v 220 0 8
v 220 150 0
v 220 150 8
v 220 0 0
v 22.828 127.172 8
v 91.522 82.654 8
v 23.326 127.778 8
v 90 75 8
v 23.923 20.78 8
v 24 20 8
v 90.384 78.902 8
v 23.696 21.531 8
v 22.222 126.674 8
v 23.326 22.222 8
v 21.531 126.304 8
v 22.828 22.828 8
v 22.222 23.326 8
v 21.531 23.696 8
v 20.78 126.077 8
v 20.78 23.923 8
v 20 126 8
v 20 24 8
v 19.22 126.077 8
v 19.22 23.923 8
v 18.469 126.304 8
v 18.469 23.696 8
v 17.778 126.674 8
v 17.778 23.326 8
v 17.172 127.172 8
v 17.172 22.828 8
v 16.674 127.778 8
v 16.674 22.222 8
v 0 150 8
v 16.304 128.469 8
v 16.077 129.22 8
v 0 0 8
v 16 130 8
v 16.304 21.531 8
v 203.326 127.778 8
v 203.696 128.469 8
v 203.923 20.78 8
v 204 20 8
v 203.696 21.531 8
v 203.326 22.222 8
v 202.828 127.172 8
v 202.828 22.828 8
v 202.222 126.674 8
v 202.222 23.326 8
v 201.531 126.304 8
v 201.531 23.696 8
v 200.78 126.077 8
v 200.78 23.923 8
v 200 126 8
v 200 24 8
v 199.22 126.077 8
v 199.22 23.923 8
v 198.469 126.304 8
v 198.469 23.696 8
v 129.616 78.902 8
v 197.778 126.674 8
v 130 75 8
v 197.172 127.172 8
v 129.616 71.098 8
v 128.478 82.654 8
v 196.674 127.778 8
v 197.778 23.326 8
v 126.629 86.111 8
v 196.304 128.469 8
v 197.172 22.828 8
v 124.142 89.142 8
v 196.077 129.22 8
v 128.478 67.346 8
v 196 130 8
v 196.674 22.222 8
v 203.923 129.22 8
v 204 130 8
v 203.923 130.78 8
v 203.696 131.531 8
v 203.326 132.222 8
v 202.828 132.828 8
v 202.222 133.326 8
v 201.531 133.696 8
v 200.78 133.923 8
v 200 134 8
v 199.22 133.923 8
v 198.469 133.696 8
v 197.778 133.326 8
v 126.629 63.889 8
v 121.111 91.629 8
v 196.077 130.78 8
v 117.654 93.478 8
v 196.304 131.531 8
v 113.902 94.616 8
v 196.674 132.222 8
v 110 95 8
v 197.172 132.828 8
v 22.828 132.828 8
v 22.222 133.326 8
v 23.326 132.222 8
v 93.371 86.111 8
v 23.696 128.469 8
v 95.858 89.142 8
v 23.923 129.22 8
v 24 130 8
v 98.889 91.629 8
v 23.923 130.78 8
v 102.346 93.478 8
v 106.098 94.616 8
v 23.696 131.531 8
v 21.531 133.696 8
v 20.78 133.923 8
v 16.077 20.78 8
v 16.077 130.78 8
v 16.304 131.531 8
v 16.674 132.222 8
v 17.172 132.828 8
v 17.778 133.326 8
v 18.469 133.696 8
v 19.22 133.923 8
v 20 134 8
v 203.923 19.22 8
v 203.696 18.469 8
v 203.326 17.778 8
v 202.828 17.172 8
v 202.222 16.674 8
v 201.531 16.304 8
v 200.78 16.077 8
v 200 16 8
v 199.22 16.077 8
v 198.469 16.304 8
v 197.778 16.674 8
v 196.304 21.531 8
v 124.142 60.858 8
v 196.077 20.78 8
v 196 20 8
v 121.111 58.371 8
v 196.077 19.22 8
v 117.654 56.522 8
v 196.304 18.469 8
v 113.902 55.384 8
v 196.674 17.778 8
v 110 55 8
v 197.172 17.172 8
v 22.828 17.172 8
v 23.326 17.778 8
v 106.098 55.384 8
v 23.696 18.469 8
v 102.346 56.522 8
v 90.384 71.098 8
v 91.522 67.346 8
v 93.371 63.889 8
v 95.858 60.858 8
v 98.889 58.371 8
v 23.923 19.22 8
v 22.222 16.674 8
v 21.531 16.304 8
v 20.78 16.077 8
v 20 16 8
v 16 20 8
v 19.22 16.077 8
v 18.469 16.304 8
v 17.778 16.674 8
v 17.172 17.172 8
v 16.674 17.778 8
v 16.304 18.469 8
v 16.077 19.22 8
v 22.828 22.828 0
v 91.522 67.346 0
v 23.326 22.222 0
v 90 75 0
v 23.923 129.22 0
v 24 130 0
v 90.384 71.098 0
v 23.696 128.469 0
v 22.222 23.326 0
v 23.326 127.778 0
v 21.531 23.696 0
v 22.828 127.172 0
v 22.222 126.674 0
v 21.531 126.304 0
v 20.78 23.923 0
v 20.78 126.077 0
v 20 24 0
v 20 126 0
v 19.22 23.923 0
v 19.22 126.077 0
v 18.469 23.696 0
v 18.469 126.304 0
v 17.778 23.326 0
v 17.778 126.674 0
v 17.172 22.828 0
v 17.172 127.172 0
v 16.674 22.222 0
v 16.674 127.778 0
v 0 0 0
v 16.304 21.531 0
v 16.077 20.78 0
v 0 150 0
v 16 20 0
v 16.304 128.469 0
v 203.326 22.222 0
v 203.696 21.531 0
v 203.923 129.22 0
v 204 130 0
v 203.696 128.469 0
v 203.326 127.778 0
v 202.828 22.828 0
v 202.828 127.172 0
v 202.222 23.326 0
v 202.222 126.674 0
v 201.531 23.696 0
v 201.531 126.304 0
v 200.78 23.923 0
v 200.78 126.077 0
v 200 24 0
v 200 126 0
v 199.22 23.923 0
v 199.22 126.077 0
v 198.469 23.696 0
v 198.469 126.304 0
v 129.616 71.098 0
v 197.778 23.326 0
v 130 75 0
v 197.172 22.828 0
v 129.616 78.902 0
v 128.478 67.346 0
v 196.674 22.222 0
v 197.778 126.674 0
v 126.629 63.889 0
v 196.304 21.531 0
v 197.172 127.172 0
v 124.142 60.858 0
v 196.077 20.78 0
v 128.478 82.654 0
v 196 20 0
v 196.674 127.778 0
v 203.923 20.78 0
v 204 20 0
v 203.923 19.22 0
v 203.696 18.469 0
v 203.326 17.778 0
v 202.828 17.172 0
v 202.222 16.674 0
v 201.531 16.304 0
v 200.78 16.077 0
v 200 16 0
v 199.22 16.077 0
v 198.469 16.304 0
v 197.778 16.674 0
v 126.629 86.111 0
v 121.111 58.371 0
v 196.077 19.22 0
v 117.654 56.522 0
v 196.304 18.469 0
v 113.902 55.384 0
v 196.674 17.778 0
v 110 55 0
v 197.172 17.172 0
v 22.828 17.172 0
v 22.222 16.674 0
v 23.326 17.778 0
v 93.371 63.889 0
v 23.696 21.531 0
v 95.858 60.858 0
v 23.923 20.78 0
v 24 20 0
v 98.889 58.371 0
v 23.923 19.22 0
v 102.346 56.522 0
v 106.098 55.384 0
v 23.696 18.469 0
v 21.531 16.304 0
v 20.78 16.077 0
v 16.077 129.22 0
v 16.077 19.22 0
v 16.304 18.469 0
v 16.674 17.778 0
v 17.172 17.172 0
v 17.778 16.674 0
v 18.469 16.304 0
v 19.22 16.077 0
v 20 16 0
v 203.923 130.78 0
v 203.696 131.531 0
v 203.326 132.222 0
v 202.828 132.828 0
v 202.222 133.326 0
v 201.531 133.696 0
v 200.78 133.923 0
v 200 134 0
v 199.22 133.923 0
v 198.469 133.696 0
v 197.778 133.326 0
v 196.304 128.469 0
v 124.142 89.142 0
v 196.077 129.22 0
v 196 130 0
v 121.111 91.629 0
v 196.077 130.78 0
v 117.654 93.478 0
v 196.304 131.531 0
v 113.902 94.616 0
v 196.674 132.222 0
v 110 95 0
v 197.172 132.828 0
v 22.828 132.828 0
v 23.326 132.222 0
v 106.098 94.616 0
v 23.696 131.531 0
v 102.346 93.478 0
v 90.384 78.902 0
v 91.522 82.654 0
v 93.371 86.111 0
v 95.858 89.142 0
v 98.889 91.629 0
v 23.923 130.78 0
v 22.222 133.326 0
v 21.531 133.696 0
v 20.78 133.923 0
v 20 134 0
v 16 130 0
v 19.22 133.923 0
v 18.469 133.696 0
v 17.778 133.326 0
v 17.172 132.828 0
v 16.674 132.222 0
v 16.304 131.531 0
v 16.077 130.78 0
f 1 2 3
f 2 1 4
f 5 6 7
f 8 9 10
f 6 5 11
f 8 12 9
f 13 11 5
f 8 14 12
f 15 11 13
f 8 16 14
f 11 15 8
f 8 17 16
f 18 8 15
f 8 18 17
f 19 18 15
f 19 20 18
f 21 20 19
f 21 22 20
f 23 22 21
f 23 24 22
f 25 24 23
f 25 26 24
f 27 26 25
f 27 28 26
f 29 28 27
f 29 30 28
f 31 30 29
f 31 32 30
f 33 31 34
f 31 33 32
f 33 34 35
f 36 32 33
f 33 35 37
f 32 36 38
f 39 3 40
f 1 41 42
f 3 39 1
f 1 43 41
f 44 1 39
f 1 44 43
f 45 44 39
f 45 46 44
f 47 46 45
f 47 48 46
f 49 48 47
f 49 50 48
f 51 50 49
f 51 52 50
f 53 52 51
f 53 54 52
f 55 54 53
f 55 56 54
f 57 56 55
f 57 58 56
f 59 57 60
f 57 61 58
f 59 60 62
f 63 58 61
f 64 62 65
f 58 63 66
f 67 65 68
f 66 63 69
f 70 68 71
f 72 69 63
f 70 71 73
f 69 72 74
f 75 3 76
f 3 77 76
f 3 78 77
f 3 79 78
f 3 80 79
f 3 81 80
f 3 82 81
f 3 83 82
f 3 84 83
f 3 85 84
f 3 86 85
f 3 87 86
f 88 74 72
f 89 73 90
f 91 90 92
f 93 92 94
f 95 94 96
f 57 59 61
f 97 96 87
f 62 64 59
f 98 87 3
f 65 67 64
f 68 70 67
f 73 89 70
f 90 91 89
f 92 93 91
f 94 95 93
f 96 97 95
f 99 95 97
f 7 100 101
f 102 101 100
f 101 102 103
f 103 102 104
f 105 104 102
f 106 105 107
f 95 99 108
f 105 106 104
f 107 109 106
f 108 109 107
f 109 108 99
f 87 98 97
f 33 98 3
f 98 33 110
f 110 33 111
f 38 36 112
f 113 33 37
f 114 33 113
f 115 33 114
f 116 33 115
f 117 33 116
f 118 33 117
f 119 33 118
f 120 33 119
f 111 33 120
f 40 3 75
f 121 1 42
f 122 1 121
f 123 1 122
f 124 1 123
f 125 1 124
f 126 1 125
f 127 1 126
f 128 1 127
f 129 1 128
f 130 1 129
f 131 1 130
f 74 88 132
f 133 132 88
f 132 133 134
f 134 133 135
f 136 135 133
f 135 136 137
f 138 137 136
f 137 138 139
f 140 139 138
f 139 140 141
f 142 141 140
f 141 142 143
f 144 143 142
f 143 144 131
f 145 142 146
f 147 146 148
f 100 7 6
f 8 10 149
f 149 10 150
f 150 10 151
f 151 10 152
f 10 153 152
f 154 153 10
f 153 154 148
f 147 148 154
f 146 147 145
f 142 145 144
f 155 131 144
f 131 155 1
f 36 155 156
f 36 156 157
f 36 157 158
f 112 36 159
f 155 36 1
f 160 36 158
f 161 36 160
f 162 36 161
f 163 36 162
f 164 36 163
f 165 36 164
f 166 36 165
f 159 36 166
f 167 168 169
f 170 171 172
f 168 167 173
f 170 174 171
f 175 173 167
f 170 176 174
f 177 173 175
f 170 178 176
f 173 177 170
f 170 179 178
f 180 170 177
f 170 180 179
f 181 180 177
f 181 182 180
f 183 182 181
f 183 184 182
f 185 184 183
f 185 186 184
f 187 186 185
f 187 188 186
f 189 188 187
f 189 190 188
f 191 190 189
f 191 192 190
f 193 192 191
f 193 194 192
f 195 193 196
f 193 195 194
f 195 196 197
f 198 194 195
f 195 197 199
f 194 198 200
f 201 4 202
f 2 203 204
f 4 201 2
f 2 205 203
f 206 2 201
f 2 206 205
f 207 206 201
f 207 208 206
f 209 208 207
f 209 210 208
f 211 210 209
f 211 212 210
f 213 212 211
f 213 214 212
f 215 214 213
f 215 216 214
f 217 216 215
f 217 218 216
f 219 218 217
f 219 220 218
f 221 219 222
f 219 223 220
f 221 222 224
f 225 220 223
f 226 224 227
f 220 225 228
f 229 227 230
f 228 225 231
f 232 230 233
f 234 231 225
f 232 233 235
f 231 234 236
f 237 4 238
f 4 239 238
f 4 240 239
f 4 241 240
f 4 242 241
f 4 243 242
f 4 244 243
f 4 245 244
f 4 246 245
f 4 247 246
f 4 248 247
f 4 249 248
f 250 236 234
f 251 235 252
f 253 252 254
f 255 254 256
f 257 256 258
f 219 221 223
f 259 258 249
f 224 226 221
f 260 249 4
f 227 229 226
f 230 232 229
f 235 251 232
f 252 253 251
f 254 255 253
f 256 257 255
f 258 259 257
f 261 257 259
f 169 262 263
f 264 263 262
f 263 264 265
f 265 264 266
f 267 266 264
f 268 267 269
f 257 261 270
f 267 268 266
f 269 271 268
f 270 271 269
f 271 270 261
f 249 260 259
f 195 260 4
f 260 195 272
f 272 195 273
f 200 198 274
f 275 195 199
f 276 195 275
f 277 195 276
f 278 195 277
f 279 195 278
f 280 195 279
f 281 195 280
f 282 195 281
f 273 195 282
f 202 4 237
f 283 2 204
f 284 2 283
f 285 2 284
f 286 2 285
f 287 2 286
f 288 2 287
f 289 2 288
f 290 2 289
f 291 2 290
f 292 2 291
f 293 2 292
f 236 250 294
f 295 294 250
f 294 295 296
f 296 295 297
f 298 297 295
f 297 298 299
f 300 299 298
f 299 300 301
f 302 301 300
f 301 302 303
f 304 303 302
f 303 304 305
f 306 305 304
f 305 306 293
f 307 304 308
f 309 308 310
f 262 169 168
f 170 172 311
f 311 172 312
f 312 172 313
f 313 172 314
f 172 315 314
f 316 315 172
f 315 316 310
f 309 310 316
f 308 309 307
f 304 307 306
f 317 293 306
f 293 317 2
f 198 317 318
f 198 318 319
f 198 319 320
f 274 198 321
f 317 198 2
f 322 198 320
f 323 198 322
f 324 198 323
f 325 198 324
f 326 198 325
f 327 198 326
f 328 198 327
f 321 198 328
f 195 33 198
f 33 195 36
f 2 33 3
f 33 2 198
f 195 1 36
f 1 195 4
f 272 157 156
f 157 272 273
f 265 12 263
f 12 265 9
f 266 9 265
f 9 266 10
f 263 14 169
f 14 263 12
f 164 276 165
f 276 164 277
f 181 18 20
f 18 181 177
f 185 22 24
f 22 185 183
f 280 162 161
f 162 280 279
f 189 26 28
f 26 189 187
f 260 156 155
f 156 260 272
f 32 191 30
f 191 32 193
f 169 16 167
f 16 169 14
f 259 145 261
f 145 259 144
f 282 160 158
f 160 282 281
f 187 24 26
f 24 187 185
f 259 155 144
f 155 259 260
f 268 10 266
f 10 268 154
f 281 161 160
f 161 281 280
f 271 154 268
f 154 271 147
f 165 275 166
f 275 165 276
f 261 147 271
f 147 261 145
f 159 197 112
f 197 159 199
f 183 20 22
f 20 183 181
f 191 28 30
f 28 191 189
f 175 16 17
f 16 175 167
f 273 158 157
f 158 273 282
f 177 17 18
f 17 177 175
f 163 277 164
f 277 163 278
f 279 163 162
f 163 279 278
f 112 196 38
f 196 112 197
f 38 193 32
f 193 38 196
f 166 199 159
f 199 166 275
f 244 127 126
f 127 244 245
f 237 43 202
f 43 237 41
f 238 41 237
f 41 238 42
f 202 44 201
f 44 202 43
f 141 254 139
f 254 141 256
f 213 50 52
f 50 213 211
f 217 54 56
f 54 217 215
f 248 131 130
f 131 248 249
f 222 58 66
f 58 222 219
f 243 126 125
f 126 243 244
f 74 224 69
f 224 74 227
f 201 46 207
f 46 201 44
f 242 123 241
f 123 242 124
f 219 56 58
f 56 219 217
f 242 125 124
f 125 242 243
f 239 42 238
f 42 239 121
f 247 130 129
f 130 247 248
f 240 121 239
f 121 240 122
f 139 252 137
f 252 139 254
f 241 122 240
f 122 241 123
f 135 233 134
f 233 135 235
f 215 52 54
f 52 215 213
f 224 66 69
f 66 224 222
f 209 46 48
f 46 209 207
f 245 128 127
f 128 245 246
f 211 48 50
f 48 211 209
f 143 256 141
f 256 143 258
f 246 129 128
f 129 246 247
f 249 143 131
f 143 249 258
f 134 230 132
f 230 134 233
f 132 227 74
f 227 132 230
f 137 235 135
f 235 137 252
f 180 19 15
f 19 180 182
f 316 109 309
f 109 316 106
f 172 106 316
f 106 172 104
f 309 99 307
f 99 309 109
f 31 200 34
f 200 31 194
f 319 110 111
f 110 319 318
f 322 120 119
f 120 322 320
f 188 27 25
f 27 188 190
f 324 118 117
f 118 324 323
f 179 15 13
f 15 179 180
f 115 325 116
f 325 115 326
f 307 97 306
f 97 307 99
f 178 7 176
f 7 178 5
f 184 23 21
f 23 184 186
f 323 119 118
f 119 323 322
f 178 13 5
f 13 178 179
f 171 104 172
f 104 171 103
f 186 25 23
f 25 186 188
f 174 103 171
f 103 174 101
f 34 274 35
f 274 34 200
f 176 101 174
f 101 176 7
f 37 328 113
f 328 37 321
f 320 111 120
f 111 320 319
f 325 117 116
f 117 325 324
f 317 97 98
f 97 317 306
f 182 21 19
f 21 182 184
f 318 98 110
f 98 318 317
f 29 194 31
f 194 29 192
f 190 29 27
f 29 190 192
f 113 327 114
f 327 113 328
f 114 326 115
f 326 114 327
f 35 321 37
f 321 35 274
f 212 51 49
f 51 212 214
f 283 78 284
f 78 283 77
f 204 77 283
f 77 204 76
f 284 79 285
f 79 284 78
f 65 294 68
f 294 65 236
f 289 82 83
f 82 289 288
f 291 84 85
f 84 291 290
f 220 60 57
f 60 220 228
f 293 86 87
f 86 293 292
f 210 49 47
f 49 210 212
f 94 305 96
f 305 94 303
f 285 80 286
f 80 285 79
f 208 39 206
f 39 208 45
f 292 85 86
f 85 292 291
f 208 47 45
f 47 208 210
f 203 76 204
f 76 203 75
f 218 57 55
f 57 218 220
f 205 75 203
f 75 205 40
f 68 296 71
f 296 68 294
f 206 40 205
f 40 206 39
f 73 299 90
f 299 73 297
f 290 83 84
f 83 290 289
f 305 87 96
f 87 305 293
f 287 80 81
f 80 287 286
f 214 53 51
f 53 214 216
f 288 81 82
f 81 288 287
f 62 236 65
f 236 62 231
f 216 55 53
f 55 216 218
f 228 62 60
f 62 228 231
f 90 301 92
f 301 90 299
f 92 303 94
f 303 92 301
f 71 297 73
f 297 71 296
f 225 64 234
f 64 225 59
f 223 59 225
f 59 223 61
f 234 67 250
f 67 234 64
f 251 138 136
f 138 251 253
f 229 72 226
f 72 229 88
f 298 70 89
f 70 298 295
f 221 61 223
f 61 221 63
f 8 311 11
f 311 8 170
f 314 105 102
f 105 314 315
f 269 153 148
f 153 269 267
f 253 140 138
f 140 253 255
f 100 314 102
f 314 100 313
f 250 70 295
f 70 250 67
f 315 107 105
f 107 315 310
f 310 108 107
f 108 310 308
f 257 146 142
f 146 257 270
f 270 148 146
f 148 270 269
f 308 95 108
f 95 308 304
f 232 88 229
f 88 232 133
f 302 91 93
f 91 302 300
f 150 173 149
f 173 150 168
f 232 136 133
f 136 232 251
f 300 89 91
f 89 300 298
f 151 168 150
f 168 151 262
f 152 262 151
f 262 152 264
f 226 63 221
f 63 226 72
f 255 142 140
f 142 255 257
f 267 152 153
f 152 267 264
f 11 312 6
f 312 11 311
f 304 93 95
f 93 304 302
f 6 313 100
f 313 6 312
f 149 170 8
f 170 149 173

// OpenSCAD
$fn = 32;

// ----------------------------------------------------------------------
// Big plate: 200-250 mm adapter plate
// ----------------------------------------------------------------------

// --- parameters (mm) ---
plate_l = 220;            // plate length, X
plate_w = 150;            // plate width, Y
plate_t = 8;              // plate thickness, Z
corner_d = 8;             // corner hole diameter
corner_in = 20;           // corner hole inset from the edges
bore_d = 40;              // central bore

difference() {
  cube([plate_l, plate_w, plate_t]);
  translate([corner_in, corner_in, -1]) cylinder(h = plate_t + 2, d = corner_d);
  translate([plate_l - corner_in, corner_in, -1]) cylinder(h = plate_t + 2, d = corner_d);
  translate([corner_in, plate_w - corner_in, -1]) cylinder(h = plate_t + 2, d = corner_d);
  translate([plate_l - corner_in, plate_w - corner_in, -1]) cylinder(h = plate_t + 2, d = corner_d);
  translate([plate_l / 2, plate_w / 2, -1]) cylinder(h = plate_t + 2, d = bore_d);
}
